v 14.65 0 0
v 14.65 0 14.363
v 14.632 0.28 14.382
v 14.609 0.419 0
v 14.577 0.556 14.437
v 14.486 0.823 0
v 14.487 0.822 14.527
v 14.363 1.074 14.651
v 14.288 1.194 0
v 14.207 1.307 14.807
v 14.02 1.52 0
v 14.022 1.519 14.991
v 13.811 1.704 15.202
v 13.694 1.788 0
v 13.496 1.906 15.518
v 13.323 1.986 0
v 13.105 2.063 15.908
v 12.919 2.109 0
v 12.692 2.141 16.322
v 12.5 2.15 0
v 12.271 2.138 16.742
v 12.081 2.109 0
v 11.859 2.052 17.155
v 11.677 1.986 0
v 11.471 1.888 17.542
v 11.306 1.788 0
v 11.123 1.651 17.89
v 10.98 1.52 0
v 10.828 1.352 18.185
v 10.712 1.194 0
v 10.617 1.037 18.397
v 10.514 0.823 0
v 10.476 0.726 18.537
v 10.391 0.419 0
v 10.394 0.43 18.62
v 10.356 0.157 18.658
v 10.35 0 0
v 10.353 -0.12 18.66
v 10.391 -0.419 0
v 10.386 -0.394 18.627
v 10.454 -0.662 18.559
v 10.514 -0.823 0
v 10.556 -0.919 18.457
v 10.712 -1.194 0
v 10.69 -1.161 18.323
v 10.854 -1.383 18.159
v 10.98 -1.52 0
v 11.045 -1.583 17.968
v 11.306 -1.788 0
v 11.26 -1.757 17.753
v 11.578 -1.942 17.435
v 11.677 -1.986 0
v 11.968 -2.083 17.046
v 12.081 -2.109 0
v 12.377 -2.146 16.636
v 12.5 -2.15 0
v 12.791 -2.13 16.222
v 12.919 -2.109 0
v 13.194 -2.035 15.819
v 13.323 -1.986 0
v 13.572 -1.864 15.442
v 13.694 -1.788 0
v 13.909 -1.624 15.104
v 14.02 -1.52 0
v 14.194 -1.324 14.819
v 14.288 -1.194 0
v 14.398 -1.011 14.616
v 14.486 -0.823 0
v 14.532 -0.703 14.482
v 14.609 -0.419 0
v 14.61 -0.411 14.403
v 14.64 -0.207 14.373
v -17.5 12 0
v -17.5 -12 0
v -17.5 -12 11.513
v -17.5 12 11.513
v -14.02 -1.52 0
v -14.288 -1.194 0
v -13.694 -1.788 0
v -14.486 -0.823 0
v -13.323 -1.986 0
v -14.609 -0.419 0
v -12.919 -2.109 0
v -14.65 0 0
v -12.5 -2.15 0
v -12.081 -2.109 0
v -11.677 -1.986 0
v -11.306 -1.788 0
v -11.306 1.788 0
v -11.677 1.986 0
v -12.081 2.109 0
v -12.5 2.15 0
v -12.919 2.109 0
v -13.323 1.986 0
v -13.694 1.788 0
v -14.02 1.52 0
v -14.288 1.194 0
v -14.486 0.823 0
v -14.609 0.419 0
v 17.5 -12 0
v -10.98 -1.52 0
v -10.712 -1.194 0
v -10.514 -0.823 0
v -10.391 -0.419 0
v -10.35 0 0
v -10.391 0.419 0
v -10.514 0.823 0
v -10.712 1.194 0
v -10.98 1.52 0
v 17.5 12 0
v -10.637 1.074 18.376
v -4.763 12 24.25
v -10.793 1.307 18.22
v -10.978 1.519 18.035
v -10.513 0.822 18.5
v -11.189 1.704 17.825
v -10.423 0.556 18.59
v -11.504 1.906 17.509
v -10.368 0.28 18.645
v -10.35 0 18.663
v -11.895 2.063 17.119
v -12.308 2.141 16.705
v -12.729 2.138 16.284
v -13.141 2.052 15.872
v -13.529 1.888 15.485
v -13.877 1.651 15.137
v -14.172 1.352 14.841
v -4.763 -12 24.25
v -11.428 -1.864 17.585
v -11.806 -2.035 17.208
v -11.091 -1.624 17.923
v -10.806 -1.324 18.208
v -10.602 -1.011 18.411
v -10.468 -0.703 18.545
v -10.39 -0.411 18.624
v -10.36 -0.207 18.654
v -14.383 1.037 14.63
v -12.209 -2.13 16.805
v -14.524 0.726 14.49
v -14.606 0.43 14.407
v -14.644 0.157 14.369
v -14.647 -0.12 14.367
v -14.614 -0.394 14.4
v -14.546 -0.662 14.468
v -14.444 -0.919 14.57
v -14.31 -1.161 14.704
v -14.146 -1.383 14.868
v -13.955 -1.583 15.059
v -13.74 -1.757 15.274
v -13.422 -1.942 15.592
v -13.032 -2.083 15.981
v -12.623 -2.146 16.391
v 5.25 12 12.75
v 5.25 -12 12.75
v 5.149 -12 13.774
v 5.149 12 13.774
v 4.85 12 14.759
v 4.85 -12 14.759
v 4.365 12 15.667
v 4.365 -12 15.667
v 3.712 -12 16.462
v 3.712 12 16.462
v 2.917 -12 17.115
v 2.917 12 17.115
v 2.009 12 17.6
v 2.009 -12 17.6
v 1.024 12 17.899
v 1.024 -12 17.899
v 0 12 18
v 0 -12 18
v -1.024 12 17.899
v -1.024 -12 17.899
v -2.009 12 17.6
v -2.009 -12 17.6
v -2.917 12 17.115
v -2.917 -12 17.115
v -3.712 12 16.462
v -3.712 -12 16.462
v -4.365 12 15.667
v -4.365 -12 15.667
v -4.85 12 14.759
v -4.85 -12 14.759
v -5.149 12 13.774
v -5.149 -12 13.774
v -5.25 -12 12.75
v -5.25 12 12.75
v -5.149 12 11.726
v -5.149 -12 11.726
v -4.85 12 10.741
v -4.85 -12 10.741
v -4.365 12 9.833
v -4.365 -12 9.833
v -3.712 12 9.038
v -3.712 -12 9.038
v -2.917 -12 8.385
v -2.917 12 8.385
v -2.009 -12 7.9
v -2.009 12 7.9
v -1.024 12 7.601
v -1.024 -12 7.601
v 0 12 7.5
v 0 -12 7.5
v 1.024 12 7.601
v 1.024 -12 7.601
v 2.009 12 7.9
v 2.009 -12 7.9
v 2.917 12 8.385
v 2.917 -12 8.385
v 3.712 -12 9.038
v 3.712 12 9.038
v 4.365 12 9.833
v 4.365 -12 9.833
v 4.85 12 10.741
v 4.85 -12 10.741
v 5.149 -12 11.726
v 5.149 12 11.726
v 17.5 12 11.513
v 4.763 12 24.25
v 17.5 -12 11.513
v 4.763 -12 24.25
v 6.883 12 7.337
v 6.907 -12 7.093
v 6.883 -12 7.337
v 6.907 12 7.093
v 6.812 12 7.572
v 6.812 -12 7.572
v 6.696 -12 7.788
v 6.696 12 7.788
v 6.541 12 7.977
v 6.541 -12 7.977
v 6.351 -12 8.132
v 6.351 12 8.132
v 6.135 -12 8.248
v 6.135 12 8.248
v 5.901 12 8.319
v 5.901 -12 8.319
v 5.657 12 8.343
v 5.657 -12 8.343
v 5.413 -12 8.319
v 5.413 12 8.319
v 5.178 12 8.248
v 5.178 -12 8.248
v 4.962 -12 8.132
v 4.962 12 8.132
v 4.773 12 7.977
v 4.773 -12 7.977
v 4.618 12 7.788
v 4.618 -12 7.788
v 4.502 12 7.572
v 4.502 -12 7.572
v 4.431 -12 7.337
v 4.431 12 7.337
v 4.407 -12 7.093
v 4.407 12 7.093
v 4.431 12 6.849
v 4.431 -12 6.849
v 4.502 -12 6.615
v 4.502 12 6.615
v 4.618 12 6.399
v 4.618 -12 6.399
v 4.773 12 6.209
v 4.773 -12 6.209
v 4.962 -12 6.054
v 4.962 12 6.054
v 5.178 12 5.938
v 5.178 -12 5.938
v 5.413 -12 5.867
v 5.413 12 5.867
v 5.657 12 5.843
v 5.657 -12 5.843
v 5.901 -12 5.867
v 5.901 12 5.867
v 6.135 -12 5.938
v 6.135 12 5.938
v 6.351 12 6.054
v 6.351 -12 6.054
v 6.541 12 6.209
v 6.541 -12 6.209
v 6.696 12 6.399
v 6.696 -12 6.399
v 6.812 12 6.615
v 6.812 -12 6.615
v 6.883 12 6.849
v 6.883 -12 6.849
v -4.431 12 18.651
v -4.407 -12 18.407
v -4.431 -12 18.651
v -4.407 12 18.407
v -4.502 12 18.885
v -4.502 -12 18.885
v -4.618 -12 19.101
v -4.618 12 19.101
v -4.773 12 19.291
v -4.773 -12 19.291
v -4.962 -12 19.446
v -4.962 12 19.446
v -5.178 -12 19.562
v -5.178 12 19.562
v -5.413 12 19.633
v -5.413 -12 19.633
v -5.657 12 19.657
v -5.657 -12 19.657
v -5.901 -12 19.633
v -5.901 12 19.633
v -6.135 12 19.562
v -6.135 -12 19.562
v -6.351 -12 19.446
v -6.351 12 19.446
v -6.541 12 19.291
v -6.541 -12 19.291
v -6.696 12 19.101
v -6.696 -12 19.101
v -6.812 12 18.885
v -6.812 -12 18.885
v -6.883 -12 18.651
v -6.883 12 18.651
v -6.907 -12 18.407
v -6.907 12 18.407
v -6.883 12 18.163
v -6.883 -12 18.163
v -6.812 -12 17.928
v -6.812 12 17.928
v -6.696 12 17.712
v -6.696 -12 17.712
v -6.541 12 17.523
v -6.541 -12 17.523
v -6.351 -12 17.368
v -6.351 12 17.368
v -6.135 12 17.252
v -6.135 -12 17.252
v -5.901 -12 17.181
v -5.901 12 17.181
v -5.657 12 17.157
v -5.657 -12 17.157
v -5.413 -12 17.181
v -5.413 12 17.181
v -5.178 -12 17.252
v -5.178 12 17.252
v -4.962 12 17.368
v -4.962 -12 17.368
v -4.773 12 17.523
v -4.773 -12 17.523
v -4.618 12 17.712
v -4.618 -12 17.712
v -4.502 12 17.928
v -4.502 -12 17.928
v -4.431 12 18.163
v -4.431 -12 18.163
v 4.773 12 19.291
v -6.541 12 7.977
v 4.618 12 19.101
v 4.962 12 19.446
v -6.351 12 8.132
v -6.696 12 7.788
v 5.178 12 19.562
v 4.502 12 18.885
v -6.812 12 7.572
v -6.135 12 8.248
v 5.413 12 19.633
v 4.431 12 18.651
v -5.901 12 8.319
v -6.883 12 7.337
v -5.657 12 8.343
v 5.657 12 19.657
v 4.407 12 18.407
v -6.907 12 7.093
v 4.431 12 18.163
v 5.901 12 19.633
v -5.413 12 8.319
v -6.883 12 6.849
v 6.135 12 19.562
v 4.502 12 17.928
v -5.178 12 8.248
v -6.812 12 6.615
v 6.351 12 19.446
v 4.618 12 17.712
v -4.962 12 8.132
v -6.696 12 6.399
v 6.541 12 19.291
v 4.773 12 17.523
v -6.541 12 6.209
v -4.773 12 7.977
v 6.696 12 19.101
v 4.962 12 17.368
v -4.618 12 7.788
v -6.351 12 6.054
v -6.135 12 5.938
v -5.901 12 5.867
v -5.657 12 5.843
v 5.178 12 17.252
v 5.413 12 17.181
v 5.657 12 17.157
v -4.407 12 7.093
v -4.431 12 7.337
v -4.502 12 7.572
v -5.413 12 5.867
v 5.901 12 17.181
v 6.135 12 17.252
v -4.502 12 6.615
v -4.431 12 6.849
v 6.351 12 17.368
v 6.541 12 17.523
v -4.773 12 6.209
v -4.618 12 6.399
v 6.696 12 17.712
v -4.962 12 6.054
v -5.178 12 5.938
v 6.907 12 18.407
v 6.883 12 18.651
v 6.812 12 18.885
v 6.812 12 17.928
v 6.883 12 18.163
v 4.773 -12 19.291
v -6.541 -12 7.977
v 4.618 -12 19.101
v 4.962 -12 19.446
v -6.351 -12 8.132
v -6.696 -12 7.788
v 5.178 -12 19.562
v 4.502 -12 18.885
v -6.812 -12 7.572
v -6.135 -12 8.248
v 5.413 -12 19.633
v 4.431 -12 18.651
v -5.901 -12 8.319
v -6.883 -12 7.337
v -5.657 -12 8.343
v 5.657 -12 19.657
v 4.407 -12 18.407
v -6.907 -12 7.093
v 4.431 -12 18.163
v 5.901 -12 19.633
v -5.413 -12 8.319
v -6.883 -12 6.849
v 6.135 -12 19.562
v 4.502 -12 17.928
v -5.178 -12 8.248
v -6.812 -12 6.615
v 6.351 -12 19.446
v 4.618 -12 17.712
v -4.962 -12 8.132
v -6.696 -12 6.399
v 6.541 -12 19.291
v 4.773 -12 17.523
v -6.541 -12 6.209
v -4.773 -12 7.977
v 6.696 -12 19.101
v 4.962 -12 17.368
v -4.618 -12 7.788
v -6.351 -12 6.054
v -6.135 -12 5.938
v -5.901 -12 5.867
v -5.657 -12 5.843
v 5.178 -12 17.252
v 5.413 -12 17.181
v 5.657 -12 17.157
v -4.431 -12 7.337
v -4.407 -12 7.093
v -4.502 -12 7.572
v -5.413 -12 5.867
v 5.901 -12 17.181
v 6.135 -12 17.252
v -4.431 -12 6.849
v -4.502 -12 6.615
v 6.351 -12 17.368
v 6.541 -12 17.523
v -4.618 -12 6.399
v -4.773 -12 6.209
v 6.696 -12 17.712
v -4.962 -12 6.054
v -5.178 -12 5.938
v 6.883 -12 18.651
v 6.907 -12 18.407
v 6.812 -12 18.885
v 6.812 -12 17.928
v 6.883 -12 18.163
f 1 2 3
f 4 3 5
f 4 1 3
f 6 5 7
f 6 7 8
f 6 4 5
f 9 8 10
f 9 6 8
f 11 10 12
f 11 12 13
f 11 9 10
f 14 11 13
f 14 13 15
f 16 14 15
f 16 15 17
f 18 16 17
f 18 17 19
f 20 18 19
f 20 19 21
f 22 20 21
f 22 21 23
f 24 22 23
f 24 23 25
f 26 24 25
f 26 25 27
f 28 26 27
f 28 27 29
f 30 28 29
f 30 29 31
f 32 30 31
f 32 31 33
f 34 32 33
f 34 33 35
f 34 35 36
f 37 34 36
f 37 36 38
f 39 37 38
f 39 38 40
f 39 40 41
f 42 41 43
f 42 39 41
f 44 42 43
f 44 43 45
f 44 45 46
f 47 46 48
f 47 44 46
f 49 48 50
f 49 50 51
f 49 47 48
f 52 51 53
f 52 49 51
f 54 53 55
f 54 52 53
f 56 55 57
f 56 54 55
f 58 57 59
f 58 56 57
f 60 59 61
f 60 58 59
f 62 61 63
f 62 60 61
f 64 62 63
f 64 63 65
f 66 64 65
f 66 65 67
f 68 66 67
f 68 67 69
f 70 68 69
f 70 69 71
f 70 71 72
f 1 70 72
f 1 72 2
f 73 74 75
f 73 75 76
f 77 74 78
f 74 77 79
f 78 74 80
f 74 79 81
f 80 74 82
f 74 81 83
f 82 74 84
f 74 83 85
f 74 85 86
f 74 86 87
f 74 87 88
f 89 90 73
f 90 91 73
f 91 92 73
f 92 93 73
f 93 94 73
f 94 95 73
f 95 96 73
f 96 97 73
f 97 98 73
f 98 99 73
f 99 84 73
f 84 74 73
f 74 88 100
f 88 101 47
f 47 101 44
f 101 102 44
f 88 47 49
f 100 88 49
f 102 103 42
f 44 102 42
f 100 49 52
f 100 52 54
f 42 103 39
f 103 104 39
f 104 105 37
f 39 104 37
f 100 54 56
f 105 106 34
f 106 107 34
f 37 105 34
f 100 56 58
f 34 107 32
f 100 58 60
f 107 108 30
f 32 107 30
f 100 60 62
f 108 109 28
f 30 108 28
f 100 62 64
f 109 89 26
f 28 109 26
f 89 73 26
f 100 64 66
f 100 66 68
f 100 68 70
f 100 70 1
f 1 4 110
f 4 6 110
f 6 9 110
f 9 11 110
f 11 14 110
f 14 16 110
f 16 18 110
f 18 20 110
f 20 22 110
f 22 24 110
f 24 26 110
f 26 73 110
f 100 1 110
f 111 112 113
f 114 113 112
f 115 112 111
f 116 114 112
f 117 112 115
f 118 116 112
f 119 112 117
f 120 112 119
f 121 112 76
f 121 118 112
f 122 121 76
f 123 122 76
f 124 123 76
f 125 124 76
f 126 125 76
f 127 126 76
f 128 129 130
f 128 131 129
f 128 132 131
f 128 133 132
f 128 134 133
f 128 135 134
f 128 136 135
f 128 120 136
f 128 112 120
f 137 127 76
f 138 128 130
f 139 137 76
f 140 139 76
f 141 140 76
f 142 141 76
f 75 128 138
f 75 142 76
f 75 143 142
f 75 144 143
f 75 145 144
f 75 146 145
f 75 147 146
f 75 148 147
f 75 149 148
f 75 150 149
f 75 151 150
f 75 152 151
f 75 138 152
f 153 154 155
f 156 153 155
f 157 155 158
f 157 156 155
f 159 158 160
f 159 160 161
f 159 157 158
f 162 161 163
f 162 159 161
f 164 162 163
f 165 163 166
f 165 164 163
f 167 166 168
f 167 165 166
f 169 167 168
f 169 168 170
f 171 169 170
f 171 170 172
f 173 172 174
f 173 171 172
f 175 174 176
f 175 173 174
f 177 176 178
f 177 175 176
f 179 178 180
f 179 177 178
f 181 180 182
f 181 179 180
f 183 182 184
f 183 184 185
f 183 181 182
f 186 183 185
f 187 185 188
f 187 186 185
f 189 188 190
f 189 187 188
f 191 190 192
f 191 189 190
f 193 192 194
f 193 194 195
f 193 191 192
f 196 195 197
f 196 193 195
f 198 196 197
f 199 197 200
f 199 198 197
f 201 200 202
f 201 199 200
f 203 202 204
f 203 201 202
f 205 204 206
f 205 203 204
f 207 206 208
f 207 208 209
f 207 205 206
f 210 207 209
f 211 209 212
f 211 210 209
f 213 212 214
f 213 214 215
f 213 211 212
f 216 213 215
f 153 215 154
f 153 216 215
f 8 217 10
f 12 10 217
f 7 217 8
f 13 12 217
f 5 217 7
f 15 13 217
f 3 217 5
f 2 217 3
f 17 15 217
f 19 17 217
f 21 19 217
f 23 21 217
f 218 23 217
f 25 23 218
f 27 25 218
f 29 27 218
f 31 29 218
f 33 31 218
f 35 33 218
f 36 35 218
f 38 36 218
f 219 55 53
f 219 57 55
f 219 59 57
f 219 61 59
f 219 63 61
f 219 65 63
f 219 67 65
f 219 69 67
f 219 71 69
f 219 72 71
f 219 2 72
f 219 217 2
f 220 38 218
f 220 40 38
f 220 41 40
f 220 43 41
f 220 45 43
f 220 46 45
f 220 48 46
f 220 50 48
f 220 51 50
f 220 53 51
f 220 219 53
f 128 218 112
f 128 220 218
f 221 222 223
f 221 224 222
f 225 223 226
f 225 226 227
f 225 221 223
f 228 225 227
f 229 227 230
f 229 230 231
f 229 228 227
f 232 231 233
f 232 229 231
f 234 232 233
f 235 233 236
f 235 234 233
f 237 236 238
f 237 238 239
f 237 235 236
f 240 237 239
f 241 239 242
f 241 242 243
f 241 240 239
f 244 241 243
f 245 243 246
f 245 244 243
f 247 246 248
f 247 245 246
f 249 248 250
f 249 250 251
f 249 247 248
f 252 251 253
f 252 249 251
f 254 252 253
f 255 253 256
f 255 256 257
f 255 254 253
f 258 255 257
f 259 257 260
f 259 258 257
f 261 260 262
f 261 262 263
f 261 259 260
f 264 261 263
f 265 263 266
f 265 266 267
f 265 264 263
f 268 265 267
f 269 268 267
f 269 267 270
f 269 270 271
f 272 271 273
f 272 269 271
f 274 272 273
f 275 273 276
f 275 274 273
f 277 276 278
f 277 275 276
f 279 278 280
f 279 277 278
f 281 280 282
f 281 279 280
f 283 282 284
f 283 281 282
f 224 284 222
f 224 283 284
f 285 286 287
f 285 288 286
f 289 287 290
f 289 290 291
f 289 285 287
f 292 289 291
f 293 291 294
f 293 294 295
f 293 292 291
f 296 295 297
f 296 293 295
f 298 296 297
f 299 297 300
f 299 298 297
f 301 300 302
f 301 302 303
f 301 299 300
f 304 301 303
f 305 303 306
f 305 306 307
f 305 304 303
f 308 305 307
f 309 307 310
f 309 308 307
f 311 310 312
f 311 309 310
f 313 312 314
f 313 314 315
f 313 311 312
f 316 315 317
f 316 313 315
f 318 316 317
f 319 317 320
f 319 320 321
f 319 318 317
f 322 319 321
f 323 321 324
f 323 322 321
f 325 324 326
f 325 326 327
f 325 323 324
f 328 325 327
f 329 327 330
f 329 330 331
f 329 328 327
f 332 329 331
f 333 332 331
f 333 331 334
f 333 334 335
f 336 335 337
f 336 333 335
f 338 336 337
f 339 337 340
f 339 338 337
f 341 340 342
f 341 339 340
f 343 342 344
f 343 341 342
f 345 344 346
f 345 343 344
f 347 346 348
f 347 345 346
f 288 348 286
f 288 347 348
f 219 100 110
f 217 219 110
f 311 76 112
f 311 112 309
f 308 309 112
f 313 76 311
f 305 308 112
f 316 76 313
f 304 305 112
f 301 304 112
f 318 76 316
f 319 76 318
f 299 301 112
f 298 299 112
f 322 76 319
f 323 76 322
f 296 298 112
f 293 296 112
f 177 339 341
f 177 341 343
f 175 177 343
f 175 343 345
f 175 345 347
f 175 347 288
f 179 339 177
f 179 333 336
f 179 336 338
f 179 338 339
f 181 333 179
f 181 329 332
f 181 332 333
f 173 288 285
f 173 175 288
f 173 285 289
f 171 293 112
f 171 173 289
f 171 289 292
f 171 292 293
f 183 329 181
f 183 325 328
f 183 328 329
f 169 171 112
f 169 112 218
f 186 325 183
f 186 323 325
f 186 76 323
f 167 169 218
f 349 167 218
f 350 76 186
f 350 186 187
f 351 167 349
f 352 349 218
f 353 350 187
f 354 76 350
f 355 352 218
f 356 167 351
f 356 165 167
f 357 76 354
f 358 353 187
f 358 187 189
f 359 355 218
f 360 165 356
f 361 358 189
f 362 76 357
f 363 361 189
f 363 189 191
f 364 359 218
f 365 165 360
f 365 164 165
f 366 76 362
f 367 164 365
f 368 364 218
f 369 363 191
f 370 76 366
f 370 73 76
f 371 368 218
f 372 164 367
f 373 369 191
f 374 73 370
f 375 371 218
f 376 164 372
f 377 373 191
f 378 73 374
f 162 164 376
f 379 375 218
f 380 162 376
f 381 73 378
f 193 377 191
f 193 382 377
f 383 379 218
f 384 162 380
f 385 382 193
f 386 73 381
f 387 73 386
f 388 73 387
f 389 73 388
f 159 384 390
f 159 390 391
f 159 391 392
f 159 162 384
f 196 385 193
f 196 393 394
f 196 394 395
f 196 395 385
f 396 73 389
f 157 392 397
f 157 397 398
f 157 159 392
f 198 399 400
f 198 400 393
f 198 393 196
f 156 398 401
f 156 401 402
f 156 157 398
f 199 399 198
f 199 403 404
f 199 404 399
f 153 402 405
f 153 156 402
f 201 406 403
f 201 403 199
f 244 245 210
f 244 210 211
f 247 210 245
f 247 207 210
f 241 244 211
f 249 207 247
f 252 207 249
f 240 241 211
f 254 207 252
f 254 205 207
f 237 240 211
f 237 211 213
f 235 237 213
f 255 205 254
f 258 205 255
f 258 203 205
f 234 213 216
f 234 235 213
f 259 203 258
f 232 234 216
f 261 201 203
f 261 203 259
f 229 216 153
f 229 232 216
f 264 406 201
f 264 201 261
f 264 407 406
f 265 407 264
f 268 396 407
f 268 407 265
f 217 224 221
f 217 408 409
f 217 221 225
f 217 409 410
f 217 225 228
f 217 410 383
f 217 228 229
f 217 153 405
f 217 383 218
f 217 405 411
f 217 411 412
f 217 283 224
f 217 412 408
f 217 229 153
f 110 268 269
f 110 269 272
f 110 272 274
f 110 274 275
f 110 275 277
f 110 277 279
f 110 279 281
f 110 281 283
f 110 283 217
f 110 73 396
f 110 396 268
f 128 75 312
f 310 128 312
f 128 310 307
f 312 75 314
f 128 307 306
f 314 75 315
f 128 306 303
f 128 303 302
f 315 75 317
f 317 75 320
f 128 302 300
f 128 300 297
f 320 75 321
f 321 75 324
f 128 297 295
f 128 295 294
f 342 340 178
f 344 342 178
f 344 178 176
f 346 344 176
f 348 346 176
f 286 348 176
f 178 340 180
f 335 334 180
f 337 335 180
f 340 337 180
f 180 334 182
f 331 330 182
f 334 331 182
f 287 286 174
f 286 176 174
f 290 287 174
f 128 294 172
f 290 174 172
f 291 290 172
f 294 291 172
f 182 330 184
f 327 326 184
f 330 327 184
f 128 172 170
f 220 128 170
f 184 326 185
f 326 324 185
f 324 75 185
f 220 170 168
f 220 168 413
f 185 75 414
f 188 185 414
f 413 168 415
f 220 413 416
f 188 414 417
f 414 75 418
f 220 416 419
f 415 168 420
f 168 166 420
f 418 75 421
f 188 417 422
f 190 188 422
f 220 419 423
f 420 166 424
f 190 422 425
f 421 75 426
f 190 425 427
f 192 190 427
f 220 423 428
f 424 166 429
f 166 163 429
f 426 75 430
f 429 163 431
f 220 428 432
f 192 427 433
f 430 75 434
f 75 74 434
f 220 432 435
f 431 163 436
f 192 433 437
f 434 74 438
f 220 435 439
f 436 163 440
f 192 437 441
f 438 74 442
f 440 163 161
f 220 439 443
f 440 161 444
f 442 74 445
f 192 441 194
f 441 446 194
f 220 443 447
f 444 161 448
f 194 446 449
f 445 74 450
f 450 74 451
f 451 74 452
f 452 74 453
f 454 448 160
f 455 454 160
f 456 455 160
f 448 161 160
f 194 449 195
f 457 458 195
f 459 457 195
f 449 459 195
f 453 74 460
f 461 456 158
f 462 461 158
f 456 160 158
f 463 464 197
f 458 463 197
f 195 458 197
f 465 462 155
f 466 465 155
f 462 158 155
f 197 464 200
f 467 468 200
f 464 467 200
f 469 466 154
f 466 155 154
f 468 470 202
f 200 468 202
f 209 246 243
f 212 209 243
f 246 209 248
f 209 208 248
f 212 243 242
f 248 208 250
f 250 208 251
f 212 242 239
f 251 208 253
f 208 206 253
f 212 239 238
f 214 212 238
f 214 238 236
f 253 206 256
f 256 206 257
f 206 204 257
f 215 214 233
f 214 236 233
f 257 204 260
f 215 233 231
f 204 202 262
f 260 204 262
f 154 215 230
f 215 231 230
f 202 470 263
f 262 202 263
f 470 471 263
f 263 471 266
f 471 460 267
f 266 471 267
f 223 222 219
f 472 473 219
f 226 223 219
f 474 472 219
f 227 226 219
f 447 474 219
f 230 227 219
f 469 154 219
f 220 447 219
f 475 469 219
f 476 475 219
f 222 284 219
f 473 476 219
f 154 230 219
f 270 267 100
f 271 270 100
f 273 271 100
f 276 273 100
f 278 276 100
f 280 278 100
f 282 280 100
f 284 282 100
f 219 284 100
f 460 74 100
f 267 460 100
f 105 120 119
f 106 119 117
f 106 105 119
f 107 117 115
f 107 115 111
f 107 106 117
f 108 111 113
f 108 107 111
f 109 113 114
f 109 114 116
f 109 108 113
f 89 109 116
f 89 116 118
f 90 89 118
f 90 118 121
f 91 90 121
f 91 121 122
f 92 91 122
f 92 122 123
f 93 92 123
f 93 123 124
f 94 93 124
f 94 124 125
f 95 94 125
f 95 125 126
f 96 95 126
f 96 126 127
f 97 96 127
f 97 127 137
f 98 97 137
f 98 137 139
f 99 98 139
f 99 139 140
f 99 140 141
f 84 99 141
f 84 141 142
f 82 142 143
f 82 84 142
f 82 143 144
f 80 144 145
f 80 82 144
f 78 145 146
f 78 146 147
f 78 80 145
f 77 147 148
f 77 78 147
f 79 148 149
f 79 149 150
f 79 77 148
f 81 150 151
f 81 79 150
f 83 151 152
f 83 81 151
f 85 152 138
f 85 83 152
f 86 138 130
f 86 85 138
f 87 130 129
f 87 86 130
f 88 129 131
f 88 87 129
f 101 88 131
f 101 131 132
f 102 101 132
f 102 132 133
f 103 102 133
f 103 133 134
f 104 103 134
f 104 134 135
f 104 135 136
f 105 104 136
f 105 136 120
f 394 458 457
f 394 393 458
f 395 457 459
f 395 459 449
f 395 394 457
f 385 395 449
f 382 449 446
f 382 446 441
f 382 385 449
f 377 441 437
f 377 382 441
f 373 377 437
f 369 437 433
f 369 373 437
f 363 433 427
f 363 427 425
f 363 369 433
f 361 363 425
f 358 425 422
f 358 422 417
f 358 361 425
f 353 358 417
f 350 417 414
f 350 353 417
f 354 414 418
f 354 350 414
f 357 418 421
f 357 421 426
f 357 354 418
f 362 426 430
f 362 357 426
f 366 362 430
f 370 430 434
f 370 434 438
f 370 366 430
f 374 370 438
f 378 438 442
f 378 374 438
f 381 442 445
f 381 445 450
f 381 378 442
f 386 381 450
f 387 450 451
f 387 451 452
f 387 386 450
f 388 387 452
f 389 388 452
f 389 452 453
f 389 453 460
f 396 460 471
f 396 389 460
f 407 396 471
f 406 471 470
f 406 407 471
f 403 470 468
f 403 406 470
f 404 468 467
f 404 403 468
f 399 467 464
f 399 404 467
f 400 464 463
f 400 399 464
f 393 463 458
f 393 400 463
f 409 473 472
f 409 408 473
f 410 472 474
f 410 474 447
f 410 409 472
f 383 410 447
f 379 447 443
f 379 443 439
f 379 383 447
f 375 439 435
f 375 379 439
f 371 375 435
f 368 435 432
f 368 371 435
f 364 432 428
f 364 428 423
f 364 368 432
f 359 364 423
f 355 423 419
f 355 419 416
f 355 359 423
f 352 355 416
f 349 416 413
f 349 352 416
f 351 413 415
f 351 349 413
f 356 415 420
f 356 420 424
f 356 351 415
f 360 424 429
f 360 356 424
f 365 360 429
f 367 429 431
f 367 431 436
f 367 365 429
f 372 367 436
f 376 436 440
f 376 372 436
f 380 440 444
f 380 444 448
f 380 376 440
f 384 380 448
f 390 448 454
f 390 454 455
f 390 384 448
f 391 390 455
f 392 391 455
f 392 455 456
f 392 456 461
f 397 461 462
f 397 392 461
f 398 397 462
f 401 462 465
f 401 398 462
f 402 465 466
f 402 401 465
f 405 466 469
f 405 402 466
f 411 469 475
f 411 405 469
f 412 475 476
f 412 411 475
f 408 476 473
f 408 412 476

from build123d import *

# Parameters (mm, degrees)
F0_W     = 35
F0_H     = 24
F0_R     = 2.15
F1_DEPTH = 35
F2_R     = 1.25
F2_R_2   = 5.25
F3_DEPTH = 12


with BuildPart() as f1:
    # F0 (on Top) → F1 (new body)
    with BuildSketch(Plane.XY):
        Rectangle(F0_W, F0_H)
        with Locations((-12.5, 0)):
            Circle(F0_R, mode=Mode.SUBTRACT)
        with Locations((12.5, 0)):
            Circle(F0_R, mode=Mode.SUBTRACT)
    extrude(amount=F1_DEPTH)

    # F2 (on Front) → F3 (intersect, symmetric)
    with BuildSketch(Plane.XZ):
        with BuildLine():
            ThreePointArc((0, 24.25), (4.400859, 23.374615), (8.131728, 20.881728))
            Line((8.131728, 20.881728), (4.763456, 24.25))
            Line((4.763456, 24.25), (0, 24.25))
        make_face()
        with BuildLine():
            ThreePointArc((-8.131728, 20.881728), (-4.400859, 23.374615), (0, 24.25))
            Line((0, 24.25), (-4.763456, 24.25))
            Line((-4.763456, 24.25), (-8.131728, 20.881728))
        make_face()
        with BuildLine():
            Line((11.5, 0), (11.5, 12.75))
            ThreePointArc((11.5, 12.75), (10.624615, 17.150859), (8.131728, 20.881728))
            ThreePointArc((8.131728, 20.881728), (4.400859, 23.374615), (0, 24.25))
            ThreePointArc((0, 24.25), (-4.400859, 23.374615), (-8.131728, 20.881728))
            ThreePointArc((-8.131728, 20.881728), (-10.624615, 17.150859), (-11.5, 12.75))
            Line((-11.5, 12.75), (-11.5, 0))
            Line((-11.5, 0), (11.5, 0))
        make_face()
        with Locations((-5.656854, 7.093146)):
            Circle(F2_R, mode=Mode.SUBTRACT)
        with Locations((5.656854, 7.093146)):
            Circle(F2_R, mode=Mode.SUBTRACT)
        with Locations((0, 12.75)):
            Circle(F2_R_2, mode=Mode.SUBTRACT)
        with Locations((-5.656854, 18.406854)):
            Circle(F2_R, mode=Mode.SUBTRACT)
        with Locations((5.656854, 18.406854)):
            Circle(F2_R, mode=Mode.SUBTRACT)
        with BuildLine():
            Line((-17.5, 0), (-11.5, 0))
            Line((-11.5, 0), (-11.5, 12.75))
            ThreePointArc((-11.5, 12.75), (-10.624615, 17.150859), (-8.131728, 20.881728))
            Line((-8.131728, 20.881728), (-17.5, 11.513456))
            Line((-17.5, 11.513456), (-17.5, 0))
        make_face()
        with BuildLine():
            ThreePointArc((8.131728, 20.881728), (10.624615, 17.150859), (11.5, 12.75))
            Line((11.5, 12.75), (11.5, 0))
            Line((11.5, 0), (17.5, 0))
            Line((17.5, 0), (17.5, 11.513456))
            Line((17.5, 11.513456), (8.131728, 20.881728))
        make_face()
    extrude(amount=F3_DEPTH, both=True, mode=Mode.INTERSECT)


solid = f1.part
